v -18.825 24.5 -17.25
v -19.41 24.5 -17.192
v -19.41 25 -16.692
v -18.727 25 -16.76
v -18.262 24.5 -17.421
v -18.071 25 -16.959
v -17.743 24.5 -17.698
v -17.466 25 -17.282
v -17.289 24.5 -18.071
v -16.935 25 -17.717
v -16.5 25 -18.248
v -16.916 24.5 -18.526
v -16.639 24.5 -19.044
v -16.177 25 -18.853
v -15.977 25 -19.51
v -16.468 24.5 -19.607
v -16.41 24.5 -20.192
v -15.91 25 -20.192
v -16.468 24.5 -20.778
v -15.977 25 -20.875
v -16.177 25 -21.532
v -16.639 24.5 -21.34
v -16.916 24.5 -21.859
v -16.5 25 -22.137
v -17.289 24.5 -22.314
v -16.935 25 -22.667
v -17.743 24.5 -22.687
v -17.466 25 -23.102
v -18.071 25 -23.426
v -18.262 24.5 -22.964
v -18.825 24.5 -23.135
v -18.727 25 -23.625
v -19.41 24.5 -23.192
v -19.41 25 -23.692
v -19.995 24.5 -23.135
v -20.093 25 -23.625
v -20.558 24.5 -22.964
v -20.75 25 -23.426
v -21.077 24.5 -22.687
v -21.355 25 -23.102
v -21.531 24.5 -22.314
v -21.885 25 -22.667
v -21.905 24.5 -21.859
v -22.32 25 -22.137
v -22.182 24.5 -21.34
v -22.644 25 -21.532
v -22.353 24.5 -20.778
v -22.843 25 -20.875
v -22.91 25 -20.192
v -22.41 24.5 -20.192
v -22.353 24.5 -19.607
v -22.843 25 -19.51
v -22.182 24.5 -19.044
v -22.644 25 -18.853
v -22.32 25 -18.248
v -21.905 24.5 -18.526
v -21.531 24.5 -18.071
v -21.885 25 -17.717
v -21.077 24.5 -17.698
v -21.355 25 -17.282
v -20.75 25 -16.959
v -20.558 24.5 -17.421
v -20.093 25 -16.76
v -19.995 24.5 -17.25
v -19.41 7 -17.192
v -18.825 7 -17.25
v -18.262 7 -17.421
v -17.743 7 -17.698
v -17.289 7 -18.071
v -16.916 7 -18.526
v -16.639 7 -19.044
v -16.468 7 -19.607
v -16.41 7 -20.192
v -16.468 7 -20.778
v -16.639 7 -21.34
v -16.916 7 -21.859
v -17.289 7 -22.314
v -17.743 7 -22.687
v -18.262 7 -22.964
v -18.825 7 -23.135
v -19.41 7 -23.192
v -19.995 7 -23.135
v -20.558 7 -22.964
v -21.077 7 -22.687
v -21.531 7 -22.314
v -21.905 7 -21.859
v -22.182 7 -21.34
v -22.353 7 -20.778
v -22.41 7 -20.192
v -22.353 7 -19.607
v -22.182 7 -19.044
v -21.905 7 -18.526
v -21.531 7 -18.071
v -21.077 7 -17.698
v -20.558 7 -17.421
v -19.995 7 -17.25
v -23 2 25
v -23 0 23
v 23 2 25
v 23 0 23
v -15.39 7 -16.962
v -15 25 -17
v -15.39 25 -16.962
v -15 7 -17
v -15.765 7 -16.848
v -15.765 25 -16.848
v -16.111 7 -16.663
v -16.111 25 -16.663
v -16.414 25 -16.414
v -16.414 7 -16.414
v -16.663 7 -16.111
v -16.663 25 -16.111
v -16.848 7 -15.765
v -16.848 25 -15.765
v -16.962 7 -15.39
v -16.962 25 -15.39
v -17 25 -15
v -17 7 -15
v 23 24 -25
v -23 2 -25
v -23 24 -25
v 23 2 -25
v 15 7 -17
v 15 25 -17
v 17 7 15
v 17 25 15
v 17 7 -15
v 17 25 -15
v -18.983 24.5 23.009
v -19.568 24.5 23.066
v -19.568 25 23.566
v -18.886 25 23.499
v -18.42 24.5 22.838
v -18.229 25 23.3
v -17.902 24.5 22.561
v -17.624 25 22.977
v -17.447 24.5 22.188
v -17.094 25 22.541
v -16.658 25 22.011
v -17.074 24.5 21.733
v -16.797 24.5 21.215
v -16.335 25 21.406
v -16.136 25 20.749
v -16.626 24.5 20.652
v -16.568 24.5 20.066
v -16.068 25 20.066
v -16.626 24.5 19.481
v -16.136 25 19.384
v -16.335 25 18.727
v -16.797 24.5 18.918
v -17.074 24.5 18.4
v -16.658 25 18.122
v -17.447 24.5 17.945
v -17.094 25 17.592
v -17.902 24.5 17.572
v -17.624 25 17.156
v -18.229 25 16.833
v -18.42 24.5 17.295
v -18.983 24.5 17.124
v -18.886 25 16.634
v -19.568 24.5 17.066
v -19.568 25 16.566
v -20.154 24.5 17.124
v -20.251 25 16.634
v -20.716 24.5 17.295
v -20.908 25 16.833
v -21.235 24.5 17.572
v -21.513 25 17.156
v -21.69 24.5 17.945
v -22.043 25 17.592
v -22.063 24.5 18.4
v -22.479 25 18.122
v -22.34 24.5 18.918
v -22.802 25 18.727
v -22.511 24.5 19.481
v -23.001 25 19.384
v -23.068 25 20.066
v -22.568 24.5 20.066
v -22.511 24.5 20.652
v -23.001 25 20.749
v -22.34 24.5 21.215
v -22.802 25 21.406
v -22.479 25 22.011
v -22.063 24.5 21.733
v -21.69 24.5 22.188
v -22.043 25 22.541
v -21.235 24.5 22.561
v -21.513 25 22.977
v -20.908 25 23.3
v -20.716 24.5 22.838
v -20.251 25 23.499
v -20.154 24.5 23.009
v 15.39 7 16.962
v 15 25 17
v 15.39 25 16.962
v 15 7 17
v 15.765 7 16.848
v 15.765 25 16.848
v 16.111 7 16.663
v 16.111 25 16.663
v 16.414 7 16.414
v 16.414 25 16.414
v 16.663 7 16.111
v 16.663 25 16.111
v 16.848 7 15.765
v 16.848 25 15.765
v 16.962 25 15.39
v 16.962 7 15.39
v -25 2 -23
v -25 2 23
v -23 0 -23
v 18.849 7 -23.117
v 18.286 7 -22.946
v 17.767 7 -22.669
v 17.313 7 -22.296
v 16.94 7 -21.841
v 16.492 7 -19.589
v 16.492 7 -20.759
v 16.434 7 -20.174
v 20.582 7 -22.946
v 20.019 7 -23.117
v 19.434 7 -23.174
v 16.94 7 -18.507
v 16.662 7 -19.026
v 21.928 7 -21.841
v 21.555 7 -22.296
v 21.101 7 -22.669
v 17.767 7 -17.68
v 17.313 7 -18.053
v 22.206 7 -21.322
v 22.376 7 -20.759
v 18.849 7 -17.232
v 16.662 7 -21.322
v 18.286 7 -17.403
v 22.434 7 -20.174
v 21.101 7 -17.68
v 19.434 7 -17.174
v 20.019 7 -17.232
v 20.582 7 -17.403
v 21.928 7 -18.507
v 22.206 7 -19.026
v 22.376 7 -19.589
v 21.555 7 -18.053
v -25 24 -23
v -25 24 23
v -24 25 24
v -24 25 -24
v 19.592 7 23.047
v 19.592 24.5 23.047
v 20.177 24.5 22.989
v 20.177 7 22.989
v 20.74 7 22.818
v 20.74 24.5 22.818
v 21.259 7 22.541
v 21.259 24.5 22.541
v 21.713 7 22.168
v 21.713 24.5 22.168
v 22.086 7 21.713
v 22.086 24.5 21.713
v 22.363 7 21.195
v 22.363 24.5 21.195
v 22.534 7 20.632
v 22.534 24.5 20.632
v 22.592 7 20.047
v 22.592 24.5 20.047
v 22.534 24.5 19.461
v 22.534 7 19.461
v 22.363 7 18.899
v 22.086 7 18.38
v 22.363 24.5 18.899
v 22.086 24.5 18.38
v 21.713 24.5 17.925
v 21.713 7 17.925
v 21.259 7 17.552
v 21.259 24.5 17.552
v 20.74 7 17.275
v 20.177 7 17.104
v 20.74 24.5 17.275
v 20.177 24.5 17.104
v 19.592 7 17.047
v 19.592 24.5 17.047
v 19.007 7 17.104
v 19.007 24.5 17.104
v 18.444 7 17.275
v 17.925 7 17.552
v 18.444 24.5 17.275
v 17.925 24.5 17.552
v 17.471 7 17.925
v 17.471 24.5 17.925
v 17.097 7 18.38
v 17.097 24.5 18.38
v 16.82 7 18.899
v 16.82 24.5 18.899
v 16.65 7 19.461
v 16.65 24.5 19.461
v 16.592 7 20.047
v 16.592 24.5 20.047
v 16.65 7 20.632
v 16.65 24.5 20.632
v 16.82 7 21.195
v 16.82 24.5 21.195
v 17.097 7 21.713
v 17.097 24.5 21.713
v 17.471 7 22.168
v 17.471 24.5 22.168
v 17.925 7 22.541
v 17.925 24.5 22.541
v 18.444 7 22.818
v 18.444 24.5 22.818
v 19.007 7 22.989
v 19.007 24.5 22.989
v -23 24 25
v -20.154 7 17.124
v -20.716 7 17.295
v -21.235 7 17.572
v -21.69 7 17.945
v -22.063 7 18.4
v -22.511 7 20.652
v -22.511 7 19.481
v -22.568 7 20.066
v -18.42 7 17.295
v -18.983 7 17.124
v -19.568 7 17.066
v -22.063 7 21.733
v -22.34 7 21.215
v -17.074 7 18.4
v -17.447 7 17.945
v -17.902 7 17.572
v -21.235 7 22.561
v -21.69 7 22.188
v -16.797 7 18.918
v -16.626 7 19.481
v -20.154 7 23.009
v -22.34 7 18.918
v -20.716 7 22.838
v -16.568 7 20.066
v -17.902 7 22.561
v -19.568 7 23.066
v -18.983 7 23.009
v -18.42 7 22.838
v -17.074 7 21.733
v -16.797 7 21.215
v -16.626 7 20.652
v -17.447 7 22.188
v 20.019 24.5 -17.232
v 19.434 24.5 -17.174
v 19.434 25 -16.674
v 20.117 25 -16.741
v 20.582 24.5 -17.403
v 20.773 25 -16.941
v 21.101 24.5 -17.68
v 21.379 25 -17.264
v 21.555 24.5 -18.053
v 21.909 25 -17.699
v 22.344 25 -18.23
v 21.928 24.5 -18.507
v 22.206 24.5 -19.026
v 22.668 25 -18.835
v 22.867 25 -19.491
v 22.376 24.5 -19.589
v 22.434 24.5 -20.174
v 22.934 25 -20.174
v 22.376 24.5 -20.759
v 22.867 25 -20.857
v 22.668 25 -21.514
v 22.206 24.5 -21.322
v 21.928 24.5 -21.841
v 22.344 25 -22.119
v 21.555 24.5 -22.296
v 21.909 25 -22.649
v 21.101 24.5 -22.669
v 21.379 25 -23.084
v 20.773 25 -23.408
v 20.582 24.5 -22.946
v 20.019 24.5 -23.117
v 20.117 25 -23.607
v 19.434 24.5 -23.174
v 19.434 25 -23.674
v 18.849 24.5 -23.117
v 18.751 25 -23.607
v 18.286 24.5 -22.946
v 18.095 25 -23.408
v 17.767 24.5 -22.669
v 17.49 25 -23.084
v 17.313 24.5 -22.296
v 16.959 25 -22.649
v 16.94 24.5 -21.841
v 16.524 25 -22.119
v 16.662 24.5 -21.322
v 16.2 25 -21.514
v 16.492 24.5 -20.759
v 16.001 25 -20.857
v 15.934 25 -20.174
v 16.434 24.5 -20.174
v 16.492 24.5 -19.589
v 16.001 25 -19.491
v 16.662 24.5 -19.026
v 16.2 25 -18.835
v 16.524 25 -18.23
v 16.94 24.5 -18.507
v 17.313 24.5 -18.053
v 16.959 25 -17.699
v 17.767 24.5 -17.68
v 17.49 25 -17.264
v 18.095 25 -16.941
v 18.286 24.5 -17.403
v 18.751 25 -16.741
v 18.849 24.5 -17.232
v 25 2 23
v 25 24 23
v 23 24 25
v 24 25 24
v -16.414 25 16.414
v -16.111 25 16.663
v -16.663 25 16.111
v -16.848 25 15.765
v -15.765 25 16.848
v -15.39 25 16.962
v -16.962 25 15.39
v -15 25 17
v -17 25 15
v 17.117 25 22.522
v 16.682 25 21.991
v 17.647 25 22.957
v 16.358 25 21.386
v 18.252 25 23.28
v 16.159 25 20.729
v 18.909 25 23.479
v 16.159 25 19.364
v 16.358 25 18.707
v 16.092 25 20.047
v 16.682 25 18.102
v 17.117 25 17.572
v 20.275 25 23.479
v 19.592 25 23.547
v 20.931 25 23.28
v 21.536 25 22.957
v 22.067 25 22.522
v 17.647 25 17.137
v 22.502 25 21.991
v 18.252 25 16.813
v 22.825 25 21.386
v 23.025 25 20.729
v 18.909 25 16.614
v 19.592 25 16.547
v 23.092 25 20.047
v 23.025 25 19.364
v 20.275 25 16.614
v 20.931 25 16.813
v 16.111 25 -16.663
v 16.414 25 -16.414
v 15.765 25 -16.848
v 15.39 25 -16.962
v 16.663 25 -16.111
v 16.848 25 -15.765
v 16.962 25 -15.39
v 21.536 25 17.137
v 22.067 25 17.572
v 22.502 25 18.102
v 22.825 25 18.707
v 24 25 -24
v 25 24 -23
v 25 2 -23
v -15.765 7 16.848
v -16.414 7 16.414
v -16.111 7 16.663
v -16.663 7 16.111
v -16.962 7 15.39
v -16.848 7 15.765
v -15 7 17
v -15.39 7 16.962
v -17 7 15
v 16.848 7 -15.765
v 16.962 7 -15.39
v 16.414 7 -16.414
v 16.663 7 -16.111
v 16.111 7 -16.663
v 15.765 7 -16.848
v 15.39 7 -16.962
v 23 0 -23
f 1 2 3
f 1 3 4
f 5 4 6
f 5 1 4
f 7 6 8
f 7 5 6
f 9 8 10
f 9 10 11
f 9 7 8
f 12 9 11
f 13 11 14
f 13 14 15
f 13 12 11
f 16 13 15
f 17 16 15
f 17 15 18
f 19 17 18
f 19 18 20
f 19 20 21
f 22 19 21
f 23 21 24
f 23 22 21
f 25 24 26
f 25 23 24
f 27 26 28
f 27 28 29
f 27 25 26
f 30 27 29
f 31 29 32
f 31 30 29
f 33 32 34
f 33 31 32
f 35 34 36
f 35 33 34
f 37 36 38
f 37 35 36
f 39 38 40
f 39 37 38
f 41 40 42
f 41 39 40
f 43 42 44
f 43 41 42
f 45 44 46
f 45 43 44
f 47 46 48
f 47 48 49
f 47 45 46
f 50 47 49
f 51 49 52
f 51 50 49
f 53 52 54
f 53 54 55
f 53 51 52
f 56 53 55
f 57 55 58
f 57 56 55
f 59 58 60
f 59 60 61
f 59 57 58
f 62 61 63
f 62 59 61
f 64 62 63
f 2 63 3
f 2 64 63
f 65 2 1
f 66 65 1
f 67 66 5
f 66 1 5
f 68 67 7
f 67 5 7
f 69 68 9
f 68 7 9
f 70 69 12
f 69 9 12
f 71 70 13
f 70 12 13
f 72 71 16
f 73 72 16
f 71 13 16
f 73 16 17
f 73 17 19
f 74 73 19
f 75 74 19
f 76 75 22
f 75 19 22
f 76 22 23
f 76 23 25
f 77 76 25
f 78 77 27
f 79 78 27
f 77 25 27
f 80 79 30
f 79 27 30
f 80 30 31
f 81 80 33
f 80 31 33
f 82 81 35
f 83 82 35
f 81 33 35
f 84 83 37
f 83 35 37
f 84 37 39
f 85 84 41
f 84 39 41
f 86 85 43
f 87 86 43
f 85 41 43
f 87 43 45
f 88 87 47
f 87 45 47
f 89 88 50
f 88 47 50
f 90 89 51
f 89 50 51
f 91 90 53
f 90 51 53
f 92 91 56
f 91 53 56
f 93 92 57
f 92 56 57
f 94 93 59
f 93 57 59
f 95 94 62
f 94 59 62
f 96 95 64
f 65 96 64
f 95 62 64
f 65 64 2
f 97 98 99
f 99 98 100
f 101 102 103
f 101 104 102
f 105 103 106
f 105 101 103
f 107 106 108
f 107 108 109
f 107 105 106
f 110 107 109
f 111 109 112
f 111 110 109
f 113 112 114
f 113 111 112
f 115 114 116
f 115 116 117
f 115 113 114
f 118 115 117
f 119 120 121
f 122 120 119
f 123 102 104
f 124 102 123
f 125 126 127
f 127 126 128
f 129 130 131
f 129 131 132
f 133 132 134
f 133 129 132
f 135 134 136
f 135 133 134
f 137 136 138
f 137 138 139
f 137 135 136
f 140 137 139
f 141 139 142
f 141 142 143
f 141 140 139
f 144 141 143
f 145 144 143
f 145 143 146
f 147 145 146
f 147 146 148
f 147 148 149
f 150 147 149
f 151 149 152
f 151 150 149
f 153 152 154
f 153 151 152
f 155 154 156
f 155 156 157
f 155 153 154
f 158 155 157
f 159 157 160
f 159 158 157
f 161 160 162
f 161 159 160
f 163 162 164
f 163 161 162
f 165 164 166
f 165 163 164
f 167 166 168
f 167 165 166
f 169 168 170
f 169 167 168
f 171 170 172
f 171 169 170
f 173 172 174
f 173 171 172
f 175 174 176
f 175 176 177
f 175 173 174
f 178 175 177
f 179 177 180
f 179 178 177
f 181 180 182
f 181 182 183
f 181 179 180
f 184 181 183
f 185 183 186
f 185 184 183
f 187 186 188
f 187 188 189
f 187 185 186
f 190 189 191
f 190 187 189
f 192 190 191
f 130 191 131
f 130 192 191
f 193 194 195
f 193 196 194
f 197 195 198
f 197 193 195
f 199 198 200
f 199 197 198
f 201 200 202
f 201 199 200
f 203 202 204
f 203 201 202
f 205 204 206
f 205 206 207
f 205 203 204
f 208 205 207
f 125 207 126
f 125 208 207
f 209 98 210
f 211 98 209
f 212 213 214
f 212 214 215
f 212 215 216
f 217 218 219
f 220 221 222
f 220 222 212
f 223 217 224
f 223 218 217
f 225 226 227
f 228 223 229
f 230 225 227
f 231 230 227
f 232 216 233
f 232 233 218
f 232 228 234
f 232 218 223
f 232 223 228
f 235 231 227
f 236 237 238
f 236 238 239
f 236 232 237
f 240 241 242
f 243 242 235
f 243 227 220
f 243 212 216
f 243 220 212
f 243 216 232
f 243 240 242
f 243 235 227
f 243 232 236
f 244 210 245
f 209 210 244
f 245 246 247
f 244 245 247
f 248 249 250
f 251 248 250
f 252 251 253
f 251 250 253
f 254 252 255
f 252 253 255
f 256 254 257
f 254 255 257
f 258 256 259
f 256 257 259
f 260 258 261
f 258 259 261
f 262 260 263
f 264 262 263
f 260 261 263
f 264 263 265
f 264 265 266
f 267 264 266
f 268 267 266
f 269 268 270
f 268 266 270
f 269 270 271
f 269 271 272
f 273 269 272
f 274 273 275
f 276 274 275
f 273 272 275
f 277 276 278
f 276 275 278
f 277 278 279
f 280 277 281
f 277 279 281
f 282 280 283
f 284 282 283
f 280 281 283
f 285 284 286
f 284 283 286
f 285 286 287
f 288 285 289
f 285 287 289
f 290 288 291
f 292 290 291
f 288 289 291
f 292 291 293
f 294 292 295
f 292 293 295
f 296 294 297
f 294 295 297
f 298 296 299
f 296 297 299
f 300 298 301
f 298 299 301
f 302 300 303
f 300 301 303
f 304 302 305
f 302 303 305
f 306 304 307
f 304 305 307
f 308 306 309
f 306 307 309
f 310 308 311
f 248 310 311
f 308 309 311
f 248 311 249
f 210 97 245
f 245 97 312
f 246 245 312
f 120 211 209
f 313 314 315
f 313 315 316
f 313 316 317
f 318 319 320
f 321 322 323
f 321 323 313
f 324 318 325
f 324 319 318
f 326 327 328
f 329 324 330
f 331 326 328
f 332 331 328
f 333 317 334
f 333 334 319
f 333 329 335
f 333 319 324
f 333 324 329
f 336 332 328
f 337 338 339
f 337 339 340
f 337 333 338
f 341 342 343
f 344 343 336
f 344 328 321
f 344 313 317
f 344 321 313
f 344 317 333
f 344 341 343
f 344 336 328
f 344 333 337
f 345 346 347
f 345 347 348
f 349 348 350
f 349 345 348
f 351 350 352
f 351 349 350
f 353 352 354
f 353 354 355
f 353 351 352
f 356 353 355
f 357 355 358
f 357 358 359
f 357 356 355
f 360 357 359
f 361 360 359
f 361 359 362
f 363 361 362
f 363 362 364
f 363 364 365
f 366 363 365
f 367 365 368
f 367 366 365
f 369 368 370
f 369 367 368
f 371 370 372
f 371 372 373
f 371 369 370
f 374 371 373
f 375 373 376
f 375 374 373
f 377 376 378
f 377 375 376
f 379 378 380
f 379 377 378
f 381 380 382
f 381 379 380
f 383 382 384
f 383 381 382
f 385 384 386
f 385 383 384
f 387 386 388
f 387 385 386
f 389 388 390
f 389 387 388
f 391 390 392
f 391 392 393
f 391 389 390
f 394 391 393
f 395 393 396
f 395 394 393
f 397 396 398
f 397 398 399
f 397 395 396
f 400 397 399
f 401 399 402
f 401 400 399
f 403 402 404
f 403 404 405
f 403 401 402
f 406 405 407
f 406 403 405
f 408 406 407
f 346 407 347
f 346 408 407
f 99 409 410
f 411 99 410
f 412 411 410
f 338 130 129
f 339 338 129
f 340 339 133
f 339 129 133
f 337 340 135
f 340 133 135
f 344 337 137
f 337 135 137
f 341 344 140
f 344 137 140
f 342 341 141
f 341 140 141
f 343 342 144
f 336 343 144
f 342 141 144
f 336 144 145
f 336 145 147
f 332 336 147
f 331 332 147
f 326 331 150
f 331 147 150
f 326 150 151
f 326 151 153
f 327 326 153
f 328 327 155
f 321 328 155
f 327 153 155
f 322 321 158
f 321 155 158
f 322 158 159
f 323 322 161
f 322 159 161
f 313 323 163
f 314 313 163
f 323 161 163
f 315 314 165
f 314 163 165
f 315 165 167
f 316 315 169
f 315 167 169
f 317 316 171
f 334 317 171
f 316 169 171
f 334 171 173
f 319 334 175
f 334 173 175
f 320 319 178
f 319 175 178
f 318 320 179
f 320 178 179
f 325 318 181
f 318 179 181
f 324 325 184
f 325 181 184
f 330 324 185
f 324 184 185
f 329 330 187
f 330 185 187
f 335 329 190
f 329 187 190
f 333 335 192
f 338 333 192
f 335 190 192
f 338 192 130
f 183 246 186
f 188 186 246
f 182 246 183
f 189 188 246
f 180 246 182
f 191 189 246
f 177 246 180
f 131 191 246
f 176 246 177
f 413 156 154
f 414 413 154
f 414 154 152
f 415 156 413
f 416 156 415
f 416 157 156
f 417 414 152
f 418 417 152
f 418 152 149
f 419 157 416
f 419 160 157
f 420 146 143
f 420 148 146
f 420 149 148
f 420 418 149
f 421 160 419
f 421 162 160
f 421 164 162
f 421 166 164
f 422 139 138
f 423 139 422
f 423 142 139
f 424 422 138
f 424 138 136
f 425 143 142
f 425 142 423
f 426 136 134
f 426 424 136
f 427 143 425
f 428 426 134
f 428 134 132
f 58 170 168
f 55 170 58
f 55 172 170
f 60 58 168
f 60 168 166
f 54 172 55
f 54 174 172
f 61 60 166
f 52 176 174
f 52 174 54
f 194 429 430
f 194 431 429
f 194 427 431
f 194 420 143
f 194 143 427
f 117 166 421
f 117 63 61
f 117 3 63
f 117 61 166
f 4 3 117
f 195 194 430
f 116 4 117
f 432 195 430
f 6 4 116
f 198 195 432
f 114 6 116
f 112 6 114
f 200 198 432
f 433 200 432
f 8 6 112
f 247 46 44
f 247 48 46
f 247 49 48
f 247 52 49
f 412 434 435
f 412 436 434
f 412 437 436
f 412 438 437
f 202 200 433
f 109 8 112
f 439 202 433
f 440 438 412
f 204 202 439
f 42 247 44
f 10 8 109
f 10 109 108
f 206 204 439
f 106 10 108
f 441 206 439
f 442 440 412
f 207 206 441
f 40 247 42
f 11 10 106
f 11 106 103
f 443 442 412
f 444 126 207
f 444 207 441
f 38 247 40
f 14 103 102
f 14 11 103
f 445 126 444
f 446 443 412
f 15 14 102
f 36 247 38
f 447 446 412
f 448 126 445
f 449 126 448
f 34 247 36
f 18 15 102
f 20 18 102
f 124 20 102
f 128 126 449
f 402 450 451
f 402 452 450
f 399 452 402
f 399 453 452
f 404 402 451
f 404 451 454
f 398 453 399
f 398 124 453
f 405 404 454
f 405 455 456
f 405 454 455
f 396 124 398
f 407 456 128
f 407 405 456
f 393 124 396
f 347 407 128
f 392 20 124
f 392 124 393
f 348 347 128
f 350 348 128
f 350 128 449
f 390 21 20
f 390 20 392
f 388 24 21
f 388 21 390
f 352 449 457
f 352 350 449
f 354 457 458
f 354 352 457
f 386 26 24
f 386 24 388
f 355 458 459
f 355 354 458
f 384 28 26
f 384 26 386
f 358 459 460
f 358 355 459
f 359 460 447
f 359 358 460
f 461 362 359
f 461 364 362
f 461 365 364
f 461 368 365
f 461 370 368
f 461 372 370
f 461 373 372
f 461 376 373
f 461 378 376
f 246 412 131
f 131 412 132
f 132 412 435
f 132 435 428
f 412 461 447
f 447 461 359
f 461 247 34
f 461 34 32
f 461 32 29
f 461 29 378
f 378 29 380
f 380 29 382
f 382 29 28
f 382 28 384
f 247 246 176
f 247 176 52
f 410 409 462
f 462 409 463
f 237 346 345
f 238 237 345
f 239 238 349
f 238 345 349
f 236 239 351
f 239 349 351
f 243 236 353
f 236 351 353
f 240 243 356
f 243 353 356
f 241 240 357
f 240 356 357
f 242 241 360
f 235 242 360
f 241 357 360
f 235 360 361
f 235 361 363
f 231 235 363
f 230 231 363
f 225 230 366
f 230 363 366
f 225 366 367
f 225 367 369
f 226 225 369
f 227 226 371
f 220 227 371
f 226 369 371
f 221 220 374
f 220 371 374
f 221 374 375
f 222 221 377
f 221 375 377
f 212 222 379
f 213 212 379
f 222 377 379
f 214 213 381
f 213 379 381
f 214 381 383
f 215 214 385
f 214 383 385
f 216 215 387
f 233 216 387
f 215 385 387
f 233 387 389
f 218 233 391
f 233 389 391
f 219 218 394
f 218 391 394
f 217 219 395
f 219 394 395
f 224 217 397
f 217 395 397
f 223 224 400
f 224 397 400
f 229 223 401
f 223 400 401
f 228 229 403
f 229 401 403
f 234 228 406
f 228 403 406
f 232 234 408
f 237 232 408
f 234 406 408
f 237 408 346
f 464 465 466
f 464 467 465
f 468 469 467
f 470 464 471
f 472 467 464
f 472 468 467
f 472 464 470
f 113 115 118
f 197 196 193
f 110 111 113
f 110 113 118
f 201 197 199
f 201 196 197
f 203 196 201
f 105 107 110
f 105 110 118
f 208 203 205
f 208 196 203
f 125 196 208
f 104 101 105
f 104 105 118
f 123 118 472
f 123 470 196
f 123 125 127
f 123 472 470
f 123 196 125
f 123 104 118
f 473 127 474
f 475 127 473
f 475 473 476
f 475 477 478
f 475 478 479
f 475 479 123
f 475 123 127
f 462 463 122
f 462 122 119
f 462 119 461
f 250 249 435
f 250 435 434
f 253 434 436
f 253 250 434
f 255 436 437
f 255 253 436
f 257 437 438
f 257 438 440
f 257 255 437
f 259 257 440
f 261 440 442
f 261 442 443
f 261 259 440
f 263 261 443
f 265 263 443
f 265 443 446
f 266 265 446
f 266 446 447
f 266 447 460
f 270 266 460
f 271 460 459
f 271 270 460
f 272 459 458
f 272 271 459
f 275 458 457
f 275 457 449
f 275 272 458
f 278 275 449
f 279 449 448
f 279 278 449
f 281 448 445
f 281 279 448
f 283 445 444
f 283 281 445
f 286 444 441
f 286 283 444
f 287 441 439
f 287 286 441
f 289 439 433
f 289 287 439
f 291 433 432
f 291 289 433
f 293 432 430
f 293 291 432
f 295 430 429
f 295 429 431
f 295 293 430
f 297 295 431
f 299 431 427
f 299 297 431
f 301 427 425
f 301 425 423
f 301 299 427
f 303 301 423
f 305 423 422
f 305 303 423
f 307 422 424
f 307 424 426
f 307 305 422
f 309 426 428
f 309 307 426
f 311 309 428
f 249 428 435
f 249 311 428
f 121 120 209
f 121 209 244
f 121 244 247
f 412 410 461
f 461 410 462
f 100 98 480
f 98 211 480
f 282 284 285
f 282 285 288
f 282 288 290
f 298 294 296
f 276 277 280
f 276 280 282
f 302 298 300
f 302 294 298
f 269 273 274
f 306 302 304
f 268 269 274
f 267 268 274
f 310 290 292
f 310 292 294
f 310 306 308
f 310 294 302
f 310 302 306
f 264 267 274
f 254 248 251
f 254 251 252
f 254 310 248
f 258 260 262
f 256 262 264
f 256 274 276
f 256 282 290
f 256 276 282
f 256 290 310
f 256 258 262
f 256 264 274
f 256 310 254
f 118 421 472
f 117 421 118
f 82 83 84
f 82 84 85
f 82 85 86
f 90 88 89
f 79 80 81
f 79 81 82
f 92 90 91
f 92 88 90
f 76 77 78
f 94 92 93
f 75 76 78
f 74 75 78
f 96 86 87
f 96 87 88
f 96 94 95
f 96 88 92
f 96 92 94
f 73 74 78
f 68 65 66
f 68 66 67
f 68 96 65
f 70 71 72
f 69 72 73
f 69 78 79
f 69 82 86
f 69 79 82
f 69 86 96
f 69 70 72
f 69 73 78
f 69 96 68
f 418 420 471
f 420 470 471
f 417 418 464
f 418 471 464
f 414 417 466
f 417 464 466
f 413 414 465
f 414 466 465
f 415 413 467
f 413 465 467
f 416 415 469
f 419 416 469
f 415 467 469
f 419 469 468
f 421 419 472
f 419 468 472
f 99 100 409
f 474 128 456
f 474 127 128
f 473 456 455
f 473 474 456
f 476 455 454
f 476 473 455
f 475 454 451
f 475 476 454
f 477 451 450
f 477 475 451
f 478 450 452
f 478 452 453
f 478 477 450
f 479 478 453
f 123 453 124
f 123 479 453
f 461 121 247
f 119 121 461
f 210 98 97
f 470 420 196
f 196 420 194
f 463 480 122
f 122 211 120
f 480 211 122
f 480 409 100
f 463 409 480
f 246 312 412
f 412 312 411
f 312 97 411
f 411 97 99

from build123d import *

# Parameters (mm, degrees)
SKETCH1_W           = 50
SKETCH1_H           = 50
BOSS_EXTRUDE1_DEPTH = 25
SKETCH2_R           = 3
SKETCH2_W           = 34
SKETCH2_H           = 34
CUT_EXTRUDE1_DEPTH  = 18
CHAMFER1_SIZE       = 2
CHAMFER2_SIZE       = 1
FILLET1_R           = 2
CHAMFER3_SIZE       = 0.5


with BuildPart() as part:
    # Sketch1 → Boss-Extrude1 (new body)
    with BuildSketch(Plane(origin=(0, 0, 0), x_dir=(1, 0, 0), z_dir=(0, 1, 0))):
        Rectangle(SKETCH1_W, SKETCH1_H)
    extrude(amount=BOSS_EXTRUDE1_DEPTH)

    # Sketch2 → Cut-Extrude1 (cut)
    with BuildSketch(Plane(origin=(0, 25, 0), x_dir=(1, 0, 0), z_dir=(0, 1, 0))):
        with Locations(Location((-19.568429399, -20.066458938, 0), (0, 0, 270))):
            Circle(SKETCH2_R)
        with Locations(Location((-19.410173636, 20.192344443, 0), (0, 0, 270))):
            Circle(SKETCH2_R)
        with Locations(Location((19.591857754, -20.046682357, 0), (0, 0, 270))):
            Circle(SKETCH2_R)
        with Locations(Location((19.434027978, 20.17419404, 0), (0, 0, 270))):
            Circle(SKETCH2_R)
        Rectangle(SKETCH2_W, SKETCH2_H)
    extrude(amount=-CUT_EXTRUDE1_DEPTH, mode=Mode.SUBTRACT)

    # Chamfer1
    chamfer1_edges = [part.edges().sort_by_distance(p)[0] for p in [
        (0, 0, 25),
        (-25, 0, 0),
        (0, 0, -25),
        (25, 0, 0),
        (25, 12.5, 25),
        (-25, 12.5, 25),
        (-25, 12.5, -25),
        (25, 12.5, -25),
    ]]
    chamfer(chamfer1_edges, length=CHAMFER1_SIZE)

    # Chamfer2
    chamfer2_edges = [part.edges().sort_by_distance(p)[0] for p in [
        (-25, 25, 0),
        (0, 25, -25),
        (0, 25, 25),
        (25, 25, 0),
    ]]
    chamfer(chamfer2_edges, length=CHAMFER2_SIZE - 0.0001)  # a hair under: the kernel refuses the full size

    # Fillet1
    fillet1_edges = [part.edges().sort_by_distance(p)[0] for p in [
        (17, 16, 17),
        (-17, 16, 17),
        (-17, 16, -17),
        (17, 16, -17),
    ]]
    fillet(fillet1_edges, radius=FILLET1_R)

    # Chamfer3
    chamfer3_edges = [part.edges().sort_by_distance(p)[0] for p in [
        (19.591857754, 25, 17.046682357),
        (19.434027978, 25, -23.17419404),
        (-19.410173636, 25, -23.192344443),
        (-19.568429399, 25, 17.066458938),
    ]]
    chamfer(chamfer3_edges, length=CHAMFER3_SIZE)


solid = part.part
